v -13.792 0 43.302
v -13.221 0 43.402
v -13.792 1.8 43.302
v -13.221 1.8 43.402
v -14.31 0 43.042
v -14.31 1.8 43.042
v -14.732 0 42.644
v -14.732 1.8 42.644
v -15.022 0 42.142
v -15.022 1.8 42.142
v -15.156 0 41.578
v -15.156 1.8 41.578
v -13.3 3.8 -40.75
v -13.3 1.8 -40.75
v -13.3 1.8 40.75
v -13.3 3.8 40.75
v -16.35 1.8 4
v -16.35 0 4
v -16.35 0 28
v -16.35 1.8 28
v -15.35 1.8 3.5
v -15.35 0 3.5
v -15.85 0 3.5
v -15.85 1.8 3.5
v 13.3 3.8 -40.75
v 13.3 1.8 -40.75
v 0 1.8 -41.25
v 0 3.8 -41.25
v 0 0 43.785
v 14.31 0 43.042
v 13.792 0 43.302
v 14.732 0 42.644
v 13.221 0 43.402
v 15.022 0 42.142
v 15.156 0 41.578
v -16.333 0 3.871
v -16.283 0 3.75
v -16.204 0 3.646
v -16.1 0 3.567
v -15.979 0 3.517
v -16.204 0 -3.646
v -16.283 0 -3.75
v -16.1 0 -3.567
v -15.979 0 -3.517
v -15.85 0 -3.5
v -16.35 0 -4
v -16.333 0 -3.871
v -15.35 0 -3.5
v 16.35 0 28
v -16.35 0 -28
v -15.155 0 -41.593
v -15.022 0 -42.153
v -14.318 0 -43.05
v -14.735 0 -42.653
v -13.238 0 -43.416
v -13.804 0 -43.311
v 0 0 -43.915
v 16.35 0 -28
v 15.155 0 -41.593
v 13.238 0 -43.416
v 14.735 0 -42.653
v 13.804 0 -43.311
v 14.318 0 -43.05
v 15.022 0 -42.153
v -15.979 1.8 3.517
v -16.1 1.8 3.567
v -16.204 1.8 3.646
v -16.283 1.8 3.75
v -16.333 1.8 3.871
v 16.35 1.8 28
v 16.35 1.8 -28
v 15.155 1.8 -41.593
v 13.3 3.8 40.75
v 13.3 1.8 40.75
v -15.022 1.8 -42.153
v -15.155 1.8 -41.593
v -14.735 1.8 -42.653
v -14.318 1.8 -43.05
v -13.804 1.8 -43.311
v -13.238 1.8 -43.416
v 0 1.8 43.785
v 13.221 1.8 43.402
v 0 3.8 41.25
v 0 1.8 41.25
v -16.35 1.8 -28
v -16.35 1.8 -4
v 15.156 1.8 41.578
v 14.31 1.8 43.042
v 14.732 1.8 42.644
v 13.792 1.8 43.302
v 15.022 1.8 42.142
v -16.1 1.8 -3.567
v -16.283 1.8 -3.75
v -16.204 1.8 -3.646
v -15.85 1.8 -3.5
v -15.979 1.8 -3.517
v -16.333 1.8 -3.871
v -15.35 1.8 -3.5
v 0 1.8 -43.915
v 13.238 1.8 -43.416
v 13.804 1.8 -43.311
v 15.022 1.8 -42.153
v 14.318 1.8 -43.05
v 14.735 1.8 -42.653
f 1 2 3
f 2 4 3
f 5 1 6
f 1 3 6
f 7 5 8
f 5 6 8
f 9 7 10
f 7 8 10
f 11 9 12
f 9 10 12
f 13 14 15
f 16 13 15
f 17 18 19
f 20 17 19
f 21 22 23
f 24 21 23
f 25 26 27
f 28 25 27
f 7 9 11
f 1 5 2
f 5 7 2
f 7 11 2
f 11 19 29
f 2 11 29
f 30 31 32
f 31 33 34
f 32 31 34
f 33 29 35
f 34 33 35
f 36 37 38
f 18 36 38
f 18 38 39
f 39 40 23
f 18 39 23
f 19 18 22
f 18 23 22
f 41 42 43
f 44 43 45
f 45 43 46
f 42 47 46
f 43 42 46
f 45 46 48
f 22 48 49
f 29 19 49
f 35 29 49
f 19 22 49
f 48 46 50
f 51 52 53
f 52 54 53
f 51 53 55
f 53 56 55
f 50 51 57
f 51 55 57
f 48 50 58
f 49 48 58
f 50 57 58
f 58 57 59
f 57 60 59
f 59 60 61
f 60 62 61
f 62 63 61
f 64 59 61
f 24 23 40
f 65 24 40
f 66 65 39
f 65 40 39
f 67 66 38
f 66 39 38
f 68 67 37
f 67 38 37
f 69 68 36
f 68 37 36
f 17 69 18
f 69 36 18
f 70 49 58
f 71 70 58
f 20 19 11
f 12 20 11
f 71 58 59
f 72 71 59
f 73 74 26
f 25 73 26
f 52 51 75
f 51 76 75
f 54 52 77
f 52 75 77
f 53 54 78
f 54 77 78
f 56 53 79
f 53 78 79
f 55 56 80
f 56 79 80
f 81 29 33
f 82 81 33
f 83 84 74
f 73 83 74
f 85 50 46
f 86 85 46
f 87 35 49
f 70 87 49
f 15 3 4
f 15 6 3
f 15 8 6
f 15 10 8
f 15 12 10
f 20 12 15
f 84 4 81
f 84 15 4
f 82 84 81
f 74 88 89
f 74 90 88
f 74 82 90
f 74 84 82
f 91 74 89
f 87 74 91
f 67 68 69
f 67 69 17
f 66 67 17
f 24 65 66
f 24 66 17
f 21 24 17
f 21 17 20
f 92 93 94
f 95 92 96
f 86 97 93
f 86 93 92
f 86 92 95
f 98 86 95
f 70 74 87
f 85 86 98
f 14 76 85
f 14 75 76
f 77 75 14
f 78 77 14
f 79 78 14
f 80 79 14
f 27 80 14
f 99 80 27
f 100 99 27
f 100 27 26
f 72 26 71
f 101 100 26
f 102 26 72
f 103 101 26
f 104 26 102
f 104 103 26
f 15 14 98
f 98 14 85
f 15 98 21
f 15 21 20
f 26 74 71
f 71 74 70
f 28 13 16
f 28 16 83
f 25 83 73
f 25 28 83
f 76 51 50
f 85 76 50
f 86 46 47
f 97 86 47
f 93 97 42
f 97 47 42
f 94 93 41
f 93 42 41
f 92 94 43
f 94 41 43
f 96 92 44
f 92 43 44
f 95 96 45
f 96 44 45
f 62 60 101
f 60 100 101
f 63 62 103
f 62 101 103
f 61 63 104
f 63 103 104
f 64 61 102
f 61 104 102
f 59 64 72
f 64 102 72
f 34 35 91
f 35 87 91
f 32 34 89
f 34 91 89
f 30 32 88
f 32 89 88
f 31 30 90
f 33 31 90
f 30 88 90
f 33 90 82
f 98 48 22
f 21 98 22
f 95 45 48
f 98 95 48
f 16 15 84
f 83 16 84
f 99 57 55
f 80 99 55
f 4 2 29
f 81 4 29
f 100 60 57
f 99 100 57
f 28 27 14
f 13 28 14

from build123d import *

# Parameters (mm, degrees)
EXTRUDE_1_DEPTH = 1.8
EXTRUDE_2_DEPTH = 3.8
FILLET_1_R      = 2


with BuildPart() as part:
    # Эскиз1 → Бобышка-Вытянуть1 (new body)
    with BuildSketch(Plane(origin=(0, 0, 0), x_dir=(1, 0, 0), z_dir=(0, 1, 0))):
        with BuildLine():
            Line((-15, 43.349382745), (-16.35, 28))
            Line((-16.35, 28), (-16.35, 4))
            ThreePointArc((-16.35, 4), (-16.203553391, 3.646446609), (-15.85, 3.5))
            Line((-15.85, 3.5), (-15.35, 3.5))
            Line((-15.35, 3.5), (-15.35, -3.5))
            Line((-15.35, -3.5), (-15.85, -3.5))
            ThreePointArc((-15.85, -3.5), (-16.203553391, -3.646446609), (-16.35, -4))
            Line((-16.35, -4), (-16.35, -28))
            Line((-16.35, -28), (-15, -43.35061617))
            Line((-15, -43.35061617), (0, -43.784698928))
            Line((0, -43.784698928), (15, -43.35061617))
            Line((15, -43.35061617), (16.35, -28))
            Line((16.35, -28), (16.35, 28))
            Line((16.35, 28), (15, 43.349382745))
            Line((15, 43.349382745), (0, 43.915301072))
            Line((0, 43.915301072), (-15, 43.349382745))
        make_face()
    extrude(amount=EXTRUDE_1_DEPTH)

    # Эскиз4 → Бобышка-Вытянуть2 (add)
    with BuildSketch(Plane(origin=(0, 0, 0), x_dir=(1, 0, 0), z_dir=(0, 1, 0))):
        Polygon((-13.3, 40.75), (-13.3, -40.75), (0, -41.25), (13.3, -40.75), (13.3, 40.75), (0, 41.25), align=None)
    extrude(amount=EXTRUDE_2_DEPTH)

    # Скругление1
    fillet_1_edges = [part.edges().sort_by_distance(p)[0] for p in [
        (-15, 0.9, -43.349382745),
        (15, 0.9, -43.349382745),
        (15, 0.9, 43.35061617),
        (-15, 0.9, 43.35061617),
    ]]
    fillet(fillet_1_edges, radius=FILLET_1_R)


solid = part.part
